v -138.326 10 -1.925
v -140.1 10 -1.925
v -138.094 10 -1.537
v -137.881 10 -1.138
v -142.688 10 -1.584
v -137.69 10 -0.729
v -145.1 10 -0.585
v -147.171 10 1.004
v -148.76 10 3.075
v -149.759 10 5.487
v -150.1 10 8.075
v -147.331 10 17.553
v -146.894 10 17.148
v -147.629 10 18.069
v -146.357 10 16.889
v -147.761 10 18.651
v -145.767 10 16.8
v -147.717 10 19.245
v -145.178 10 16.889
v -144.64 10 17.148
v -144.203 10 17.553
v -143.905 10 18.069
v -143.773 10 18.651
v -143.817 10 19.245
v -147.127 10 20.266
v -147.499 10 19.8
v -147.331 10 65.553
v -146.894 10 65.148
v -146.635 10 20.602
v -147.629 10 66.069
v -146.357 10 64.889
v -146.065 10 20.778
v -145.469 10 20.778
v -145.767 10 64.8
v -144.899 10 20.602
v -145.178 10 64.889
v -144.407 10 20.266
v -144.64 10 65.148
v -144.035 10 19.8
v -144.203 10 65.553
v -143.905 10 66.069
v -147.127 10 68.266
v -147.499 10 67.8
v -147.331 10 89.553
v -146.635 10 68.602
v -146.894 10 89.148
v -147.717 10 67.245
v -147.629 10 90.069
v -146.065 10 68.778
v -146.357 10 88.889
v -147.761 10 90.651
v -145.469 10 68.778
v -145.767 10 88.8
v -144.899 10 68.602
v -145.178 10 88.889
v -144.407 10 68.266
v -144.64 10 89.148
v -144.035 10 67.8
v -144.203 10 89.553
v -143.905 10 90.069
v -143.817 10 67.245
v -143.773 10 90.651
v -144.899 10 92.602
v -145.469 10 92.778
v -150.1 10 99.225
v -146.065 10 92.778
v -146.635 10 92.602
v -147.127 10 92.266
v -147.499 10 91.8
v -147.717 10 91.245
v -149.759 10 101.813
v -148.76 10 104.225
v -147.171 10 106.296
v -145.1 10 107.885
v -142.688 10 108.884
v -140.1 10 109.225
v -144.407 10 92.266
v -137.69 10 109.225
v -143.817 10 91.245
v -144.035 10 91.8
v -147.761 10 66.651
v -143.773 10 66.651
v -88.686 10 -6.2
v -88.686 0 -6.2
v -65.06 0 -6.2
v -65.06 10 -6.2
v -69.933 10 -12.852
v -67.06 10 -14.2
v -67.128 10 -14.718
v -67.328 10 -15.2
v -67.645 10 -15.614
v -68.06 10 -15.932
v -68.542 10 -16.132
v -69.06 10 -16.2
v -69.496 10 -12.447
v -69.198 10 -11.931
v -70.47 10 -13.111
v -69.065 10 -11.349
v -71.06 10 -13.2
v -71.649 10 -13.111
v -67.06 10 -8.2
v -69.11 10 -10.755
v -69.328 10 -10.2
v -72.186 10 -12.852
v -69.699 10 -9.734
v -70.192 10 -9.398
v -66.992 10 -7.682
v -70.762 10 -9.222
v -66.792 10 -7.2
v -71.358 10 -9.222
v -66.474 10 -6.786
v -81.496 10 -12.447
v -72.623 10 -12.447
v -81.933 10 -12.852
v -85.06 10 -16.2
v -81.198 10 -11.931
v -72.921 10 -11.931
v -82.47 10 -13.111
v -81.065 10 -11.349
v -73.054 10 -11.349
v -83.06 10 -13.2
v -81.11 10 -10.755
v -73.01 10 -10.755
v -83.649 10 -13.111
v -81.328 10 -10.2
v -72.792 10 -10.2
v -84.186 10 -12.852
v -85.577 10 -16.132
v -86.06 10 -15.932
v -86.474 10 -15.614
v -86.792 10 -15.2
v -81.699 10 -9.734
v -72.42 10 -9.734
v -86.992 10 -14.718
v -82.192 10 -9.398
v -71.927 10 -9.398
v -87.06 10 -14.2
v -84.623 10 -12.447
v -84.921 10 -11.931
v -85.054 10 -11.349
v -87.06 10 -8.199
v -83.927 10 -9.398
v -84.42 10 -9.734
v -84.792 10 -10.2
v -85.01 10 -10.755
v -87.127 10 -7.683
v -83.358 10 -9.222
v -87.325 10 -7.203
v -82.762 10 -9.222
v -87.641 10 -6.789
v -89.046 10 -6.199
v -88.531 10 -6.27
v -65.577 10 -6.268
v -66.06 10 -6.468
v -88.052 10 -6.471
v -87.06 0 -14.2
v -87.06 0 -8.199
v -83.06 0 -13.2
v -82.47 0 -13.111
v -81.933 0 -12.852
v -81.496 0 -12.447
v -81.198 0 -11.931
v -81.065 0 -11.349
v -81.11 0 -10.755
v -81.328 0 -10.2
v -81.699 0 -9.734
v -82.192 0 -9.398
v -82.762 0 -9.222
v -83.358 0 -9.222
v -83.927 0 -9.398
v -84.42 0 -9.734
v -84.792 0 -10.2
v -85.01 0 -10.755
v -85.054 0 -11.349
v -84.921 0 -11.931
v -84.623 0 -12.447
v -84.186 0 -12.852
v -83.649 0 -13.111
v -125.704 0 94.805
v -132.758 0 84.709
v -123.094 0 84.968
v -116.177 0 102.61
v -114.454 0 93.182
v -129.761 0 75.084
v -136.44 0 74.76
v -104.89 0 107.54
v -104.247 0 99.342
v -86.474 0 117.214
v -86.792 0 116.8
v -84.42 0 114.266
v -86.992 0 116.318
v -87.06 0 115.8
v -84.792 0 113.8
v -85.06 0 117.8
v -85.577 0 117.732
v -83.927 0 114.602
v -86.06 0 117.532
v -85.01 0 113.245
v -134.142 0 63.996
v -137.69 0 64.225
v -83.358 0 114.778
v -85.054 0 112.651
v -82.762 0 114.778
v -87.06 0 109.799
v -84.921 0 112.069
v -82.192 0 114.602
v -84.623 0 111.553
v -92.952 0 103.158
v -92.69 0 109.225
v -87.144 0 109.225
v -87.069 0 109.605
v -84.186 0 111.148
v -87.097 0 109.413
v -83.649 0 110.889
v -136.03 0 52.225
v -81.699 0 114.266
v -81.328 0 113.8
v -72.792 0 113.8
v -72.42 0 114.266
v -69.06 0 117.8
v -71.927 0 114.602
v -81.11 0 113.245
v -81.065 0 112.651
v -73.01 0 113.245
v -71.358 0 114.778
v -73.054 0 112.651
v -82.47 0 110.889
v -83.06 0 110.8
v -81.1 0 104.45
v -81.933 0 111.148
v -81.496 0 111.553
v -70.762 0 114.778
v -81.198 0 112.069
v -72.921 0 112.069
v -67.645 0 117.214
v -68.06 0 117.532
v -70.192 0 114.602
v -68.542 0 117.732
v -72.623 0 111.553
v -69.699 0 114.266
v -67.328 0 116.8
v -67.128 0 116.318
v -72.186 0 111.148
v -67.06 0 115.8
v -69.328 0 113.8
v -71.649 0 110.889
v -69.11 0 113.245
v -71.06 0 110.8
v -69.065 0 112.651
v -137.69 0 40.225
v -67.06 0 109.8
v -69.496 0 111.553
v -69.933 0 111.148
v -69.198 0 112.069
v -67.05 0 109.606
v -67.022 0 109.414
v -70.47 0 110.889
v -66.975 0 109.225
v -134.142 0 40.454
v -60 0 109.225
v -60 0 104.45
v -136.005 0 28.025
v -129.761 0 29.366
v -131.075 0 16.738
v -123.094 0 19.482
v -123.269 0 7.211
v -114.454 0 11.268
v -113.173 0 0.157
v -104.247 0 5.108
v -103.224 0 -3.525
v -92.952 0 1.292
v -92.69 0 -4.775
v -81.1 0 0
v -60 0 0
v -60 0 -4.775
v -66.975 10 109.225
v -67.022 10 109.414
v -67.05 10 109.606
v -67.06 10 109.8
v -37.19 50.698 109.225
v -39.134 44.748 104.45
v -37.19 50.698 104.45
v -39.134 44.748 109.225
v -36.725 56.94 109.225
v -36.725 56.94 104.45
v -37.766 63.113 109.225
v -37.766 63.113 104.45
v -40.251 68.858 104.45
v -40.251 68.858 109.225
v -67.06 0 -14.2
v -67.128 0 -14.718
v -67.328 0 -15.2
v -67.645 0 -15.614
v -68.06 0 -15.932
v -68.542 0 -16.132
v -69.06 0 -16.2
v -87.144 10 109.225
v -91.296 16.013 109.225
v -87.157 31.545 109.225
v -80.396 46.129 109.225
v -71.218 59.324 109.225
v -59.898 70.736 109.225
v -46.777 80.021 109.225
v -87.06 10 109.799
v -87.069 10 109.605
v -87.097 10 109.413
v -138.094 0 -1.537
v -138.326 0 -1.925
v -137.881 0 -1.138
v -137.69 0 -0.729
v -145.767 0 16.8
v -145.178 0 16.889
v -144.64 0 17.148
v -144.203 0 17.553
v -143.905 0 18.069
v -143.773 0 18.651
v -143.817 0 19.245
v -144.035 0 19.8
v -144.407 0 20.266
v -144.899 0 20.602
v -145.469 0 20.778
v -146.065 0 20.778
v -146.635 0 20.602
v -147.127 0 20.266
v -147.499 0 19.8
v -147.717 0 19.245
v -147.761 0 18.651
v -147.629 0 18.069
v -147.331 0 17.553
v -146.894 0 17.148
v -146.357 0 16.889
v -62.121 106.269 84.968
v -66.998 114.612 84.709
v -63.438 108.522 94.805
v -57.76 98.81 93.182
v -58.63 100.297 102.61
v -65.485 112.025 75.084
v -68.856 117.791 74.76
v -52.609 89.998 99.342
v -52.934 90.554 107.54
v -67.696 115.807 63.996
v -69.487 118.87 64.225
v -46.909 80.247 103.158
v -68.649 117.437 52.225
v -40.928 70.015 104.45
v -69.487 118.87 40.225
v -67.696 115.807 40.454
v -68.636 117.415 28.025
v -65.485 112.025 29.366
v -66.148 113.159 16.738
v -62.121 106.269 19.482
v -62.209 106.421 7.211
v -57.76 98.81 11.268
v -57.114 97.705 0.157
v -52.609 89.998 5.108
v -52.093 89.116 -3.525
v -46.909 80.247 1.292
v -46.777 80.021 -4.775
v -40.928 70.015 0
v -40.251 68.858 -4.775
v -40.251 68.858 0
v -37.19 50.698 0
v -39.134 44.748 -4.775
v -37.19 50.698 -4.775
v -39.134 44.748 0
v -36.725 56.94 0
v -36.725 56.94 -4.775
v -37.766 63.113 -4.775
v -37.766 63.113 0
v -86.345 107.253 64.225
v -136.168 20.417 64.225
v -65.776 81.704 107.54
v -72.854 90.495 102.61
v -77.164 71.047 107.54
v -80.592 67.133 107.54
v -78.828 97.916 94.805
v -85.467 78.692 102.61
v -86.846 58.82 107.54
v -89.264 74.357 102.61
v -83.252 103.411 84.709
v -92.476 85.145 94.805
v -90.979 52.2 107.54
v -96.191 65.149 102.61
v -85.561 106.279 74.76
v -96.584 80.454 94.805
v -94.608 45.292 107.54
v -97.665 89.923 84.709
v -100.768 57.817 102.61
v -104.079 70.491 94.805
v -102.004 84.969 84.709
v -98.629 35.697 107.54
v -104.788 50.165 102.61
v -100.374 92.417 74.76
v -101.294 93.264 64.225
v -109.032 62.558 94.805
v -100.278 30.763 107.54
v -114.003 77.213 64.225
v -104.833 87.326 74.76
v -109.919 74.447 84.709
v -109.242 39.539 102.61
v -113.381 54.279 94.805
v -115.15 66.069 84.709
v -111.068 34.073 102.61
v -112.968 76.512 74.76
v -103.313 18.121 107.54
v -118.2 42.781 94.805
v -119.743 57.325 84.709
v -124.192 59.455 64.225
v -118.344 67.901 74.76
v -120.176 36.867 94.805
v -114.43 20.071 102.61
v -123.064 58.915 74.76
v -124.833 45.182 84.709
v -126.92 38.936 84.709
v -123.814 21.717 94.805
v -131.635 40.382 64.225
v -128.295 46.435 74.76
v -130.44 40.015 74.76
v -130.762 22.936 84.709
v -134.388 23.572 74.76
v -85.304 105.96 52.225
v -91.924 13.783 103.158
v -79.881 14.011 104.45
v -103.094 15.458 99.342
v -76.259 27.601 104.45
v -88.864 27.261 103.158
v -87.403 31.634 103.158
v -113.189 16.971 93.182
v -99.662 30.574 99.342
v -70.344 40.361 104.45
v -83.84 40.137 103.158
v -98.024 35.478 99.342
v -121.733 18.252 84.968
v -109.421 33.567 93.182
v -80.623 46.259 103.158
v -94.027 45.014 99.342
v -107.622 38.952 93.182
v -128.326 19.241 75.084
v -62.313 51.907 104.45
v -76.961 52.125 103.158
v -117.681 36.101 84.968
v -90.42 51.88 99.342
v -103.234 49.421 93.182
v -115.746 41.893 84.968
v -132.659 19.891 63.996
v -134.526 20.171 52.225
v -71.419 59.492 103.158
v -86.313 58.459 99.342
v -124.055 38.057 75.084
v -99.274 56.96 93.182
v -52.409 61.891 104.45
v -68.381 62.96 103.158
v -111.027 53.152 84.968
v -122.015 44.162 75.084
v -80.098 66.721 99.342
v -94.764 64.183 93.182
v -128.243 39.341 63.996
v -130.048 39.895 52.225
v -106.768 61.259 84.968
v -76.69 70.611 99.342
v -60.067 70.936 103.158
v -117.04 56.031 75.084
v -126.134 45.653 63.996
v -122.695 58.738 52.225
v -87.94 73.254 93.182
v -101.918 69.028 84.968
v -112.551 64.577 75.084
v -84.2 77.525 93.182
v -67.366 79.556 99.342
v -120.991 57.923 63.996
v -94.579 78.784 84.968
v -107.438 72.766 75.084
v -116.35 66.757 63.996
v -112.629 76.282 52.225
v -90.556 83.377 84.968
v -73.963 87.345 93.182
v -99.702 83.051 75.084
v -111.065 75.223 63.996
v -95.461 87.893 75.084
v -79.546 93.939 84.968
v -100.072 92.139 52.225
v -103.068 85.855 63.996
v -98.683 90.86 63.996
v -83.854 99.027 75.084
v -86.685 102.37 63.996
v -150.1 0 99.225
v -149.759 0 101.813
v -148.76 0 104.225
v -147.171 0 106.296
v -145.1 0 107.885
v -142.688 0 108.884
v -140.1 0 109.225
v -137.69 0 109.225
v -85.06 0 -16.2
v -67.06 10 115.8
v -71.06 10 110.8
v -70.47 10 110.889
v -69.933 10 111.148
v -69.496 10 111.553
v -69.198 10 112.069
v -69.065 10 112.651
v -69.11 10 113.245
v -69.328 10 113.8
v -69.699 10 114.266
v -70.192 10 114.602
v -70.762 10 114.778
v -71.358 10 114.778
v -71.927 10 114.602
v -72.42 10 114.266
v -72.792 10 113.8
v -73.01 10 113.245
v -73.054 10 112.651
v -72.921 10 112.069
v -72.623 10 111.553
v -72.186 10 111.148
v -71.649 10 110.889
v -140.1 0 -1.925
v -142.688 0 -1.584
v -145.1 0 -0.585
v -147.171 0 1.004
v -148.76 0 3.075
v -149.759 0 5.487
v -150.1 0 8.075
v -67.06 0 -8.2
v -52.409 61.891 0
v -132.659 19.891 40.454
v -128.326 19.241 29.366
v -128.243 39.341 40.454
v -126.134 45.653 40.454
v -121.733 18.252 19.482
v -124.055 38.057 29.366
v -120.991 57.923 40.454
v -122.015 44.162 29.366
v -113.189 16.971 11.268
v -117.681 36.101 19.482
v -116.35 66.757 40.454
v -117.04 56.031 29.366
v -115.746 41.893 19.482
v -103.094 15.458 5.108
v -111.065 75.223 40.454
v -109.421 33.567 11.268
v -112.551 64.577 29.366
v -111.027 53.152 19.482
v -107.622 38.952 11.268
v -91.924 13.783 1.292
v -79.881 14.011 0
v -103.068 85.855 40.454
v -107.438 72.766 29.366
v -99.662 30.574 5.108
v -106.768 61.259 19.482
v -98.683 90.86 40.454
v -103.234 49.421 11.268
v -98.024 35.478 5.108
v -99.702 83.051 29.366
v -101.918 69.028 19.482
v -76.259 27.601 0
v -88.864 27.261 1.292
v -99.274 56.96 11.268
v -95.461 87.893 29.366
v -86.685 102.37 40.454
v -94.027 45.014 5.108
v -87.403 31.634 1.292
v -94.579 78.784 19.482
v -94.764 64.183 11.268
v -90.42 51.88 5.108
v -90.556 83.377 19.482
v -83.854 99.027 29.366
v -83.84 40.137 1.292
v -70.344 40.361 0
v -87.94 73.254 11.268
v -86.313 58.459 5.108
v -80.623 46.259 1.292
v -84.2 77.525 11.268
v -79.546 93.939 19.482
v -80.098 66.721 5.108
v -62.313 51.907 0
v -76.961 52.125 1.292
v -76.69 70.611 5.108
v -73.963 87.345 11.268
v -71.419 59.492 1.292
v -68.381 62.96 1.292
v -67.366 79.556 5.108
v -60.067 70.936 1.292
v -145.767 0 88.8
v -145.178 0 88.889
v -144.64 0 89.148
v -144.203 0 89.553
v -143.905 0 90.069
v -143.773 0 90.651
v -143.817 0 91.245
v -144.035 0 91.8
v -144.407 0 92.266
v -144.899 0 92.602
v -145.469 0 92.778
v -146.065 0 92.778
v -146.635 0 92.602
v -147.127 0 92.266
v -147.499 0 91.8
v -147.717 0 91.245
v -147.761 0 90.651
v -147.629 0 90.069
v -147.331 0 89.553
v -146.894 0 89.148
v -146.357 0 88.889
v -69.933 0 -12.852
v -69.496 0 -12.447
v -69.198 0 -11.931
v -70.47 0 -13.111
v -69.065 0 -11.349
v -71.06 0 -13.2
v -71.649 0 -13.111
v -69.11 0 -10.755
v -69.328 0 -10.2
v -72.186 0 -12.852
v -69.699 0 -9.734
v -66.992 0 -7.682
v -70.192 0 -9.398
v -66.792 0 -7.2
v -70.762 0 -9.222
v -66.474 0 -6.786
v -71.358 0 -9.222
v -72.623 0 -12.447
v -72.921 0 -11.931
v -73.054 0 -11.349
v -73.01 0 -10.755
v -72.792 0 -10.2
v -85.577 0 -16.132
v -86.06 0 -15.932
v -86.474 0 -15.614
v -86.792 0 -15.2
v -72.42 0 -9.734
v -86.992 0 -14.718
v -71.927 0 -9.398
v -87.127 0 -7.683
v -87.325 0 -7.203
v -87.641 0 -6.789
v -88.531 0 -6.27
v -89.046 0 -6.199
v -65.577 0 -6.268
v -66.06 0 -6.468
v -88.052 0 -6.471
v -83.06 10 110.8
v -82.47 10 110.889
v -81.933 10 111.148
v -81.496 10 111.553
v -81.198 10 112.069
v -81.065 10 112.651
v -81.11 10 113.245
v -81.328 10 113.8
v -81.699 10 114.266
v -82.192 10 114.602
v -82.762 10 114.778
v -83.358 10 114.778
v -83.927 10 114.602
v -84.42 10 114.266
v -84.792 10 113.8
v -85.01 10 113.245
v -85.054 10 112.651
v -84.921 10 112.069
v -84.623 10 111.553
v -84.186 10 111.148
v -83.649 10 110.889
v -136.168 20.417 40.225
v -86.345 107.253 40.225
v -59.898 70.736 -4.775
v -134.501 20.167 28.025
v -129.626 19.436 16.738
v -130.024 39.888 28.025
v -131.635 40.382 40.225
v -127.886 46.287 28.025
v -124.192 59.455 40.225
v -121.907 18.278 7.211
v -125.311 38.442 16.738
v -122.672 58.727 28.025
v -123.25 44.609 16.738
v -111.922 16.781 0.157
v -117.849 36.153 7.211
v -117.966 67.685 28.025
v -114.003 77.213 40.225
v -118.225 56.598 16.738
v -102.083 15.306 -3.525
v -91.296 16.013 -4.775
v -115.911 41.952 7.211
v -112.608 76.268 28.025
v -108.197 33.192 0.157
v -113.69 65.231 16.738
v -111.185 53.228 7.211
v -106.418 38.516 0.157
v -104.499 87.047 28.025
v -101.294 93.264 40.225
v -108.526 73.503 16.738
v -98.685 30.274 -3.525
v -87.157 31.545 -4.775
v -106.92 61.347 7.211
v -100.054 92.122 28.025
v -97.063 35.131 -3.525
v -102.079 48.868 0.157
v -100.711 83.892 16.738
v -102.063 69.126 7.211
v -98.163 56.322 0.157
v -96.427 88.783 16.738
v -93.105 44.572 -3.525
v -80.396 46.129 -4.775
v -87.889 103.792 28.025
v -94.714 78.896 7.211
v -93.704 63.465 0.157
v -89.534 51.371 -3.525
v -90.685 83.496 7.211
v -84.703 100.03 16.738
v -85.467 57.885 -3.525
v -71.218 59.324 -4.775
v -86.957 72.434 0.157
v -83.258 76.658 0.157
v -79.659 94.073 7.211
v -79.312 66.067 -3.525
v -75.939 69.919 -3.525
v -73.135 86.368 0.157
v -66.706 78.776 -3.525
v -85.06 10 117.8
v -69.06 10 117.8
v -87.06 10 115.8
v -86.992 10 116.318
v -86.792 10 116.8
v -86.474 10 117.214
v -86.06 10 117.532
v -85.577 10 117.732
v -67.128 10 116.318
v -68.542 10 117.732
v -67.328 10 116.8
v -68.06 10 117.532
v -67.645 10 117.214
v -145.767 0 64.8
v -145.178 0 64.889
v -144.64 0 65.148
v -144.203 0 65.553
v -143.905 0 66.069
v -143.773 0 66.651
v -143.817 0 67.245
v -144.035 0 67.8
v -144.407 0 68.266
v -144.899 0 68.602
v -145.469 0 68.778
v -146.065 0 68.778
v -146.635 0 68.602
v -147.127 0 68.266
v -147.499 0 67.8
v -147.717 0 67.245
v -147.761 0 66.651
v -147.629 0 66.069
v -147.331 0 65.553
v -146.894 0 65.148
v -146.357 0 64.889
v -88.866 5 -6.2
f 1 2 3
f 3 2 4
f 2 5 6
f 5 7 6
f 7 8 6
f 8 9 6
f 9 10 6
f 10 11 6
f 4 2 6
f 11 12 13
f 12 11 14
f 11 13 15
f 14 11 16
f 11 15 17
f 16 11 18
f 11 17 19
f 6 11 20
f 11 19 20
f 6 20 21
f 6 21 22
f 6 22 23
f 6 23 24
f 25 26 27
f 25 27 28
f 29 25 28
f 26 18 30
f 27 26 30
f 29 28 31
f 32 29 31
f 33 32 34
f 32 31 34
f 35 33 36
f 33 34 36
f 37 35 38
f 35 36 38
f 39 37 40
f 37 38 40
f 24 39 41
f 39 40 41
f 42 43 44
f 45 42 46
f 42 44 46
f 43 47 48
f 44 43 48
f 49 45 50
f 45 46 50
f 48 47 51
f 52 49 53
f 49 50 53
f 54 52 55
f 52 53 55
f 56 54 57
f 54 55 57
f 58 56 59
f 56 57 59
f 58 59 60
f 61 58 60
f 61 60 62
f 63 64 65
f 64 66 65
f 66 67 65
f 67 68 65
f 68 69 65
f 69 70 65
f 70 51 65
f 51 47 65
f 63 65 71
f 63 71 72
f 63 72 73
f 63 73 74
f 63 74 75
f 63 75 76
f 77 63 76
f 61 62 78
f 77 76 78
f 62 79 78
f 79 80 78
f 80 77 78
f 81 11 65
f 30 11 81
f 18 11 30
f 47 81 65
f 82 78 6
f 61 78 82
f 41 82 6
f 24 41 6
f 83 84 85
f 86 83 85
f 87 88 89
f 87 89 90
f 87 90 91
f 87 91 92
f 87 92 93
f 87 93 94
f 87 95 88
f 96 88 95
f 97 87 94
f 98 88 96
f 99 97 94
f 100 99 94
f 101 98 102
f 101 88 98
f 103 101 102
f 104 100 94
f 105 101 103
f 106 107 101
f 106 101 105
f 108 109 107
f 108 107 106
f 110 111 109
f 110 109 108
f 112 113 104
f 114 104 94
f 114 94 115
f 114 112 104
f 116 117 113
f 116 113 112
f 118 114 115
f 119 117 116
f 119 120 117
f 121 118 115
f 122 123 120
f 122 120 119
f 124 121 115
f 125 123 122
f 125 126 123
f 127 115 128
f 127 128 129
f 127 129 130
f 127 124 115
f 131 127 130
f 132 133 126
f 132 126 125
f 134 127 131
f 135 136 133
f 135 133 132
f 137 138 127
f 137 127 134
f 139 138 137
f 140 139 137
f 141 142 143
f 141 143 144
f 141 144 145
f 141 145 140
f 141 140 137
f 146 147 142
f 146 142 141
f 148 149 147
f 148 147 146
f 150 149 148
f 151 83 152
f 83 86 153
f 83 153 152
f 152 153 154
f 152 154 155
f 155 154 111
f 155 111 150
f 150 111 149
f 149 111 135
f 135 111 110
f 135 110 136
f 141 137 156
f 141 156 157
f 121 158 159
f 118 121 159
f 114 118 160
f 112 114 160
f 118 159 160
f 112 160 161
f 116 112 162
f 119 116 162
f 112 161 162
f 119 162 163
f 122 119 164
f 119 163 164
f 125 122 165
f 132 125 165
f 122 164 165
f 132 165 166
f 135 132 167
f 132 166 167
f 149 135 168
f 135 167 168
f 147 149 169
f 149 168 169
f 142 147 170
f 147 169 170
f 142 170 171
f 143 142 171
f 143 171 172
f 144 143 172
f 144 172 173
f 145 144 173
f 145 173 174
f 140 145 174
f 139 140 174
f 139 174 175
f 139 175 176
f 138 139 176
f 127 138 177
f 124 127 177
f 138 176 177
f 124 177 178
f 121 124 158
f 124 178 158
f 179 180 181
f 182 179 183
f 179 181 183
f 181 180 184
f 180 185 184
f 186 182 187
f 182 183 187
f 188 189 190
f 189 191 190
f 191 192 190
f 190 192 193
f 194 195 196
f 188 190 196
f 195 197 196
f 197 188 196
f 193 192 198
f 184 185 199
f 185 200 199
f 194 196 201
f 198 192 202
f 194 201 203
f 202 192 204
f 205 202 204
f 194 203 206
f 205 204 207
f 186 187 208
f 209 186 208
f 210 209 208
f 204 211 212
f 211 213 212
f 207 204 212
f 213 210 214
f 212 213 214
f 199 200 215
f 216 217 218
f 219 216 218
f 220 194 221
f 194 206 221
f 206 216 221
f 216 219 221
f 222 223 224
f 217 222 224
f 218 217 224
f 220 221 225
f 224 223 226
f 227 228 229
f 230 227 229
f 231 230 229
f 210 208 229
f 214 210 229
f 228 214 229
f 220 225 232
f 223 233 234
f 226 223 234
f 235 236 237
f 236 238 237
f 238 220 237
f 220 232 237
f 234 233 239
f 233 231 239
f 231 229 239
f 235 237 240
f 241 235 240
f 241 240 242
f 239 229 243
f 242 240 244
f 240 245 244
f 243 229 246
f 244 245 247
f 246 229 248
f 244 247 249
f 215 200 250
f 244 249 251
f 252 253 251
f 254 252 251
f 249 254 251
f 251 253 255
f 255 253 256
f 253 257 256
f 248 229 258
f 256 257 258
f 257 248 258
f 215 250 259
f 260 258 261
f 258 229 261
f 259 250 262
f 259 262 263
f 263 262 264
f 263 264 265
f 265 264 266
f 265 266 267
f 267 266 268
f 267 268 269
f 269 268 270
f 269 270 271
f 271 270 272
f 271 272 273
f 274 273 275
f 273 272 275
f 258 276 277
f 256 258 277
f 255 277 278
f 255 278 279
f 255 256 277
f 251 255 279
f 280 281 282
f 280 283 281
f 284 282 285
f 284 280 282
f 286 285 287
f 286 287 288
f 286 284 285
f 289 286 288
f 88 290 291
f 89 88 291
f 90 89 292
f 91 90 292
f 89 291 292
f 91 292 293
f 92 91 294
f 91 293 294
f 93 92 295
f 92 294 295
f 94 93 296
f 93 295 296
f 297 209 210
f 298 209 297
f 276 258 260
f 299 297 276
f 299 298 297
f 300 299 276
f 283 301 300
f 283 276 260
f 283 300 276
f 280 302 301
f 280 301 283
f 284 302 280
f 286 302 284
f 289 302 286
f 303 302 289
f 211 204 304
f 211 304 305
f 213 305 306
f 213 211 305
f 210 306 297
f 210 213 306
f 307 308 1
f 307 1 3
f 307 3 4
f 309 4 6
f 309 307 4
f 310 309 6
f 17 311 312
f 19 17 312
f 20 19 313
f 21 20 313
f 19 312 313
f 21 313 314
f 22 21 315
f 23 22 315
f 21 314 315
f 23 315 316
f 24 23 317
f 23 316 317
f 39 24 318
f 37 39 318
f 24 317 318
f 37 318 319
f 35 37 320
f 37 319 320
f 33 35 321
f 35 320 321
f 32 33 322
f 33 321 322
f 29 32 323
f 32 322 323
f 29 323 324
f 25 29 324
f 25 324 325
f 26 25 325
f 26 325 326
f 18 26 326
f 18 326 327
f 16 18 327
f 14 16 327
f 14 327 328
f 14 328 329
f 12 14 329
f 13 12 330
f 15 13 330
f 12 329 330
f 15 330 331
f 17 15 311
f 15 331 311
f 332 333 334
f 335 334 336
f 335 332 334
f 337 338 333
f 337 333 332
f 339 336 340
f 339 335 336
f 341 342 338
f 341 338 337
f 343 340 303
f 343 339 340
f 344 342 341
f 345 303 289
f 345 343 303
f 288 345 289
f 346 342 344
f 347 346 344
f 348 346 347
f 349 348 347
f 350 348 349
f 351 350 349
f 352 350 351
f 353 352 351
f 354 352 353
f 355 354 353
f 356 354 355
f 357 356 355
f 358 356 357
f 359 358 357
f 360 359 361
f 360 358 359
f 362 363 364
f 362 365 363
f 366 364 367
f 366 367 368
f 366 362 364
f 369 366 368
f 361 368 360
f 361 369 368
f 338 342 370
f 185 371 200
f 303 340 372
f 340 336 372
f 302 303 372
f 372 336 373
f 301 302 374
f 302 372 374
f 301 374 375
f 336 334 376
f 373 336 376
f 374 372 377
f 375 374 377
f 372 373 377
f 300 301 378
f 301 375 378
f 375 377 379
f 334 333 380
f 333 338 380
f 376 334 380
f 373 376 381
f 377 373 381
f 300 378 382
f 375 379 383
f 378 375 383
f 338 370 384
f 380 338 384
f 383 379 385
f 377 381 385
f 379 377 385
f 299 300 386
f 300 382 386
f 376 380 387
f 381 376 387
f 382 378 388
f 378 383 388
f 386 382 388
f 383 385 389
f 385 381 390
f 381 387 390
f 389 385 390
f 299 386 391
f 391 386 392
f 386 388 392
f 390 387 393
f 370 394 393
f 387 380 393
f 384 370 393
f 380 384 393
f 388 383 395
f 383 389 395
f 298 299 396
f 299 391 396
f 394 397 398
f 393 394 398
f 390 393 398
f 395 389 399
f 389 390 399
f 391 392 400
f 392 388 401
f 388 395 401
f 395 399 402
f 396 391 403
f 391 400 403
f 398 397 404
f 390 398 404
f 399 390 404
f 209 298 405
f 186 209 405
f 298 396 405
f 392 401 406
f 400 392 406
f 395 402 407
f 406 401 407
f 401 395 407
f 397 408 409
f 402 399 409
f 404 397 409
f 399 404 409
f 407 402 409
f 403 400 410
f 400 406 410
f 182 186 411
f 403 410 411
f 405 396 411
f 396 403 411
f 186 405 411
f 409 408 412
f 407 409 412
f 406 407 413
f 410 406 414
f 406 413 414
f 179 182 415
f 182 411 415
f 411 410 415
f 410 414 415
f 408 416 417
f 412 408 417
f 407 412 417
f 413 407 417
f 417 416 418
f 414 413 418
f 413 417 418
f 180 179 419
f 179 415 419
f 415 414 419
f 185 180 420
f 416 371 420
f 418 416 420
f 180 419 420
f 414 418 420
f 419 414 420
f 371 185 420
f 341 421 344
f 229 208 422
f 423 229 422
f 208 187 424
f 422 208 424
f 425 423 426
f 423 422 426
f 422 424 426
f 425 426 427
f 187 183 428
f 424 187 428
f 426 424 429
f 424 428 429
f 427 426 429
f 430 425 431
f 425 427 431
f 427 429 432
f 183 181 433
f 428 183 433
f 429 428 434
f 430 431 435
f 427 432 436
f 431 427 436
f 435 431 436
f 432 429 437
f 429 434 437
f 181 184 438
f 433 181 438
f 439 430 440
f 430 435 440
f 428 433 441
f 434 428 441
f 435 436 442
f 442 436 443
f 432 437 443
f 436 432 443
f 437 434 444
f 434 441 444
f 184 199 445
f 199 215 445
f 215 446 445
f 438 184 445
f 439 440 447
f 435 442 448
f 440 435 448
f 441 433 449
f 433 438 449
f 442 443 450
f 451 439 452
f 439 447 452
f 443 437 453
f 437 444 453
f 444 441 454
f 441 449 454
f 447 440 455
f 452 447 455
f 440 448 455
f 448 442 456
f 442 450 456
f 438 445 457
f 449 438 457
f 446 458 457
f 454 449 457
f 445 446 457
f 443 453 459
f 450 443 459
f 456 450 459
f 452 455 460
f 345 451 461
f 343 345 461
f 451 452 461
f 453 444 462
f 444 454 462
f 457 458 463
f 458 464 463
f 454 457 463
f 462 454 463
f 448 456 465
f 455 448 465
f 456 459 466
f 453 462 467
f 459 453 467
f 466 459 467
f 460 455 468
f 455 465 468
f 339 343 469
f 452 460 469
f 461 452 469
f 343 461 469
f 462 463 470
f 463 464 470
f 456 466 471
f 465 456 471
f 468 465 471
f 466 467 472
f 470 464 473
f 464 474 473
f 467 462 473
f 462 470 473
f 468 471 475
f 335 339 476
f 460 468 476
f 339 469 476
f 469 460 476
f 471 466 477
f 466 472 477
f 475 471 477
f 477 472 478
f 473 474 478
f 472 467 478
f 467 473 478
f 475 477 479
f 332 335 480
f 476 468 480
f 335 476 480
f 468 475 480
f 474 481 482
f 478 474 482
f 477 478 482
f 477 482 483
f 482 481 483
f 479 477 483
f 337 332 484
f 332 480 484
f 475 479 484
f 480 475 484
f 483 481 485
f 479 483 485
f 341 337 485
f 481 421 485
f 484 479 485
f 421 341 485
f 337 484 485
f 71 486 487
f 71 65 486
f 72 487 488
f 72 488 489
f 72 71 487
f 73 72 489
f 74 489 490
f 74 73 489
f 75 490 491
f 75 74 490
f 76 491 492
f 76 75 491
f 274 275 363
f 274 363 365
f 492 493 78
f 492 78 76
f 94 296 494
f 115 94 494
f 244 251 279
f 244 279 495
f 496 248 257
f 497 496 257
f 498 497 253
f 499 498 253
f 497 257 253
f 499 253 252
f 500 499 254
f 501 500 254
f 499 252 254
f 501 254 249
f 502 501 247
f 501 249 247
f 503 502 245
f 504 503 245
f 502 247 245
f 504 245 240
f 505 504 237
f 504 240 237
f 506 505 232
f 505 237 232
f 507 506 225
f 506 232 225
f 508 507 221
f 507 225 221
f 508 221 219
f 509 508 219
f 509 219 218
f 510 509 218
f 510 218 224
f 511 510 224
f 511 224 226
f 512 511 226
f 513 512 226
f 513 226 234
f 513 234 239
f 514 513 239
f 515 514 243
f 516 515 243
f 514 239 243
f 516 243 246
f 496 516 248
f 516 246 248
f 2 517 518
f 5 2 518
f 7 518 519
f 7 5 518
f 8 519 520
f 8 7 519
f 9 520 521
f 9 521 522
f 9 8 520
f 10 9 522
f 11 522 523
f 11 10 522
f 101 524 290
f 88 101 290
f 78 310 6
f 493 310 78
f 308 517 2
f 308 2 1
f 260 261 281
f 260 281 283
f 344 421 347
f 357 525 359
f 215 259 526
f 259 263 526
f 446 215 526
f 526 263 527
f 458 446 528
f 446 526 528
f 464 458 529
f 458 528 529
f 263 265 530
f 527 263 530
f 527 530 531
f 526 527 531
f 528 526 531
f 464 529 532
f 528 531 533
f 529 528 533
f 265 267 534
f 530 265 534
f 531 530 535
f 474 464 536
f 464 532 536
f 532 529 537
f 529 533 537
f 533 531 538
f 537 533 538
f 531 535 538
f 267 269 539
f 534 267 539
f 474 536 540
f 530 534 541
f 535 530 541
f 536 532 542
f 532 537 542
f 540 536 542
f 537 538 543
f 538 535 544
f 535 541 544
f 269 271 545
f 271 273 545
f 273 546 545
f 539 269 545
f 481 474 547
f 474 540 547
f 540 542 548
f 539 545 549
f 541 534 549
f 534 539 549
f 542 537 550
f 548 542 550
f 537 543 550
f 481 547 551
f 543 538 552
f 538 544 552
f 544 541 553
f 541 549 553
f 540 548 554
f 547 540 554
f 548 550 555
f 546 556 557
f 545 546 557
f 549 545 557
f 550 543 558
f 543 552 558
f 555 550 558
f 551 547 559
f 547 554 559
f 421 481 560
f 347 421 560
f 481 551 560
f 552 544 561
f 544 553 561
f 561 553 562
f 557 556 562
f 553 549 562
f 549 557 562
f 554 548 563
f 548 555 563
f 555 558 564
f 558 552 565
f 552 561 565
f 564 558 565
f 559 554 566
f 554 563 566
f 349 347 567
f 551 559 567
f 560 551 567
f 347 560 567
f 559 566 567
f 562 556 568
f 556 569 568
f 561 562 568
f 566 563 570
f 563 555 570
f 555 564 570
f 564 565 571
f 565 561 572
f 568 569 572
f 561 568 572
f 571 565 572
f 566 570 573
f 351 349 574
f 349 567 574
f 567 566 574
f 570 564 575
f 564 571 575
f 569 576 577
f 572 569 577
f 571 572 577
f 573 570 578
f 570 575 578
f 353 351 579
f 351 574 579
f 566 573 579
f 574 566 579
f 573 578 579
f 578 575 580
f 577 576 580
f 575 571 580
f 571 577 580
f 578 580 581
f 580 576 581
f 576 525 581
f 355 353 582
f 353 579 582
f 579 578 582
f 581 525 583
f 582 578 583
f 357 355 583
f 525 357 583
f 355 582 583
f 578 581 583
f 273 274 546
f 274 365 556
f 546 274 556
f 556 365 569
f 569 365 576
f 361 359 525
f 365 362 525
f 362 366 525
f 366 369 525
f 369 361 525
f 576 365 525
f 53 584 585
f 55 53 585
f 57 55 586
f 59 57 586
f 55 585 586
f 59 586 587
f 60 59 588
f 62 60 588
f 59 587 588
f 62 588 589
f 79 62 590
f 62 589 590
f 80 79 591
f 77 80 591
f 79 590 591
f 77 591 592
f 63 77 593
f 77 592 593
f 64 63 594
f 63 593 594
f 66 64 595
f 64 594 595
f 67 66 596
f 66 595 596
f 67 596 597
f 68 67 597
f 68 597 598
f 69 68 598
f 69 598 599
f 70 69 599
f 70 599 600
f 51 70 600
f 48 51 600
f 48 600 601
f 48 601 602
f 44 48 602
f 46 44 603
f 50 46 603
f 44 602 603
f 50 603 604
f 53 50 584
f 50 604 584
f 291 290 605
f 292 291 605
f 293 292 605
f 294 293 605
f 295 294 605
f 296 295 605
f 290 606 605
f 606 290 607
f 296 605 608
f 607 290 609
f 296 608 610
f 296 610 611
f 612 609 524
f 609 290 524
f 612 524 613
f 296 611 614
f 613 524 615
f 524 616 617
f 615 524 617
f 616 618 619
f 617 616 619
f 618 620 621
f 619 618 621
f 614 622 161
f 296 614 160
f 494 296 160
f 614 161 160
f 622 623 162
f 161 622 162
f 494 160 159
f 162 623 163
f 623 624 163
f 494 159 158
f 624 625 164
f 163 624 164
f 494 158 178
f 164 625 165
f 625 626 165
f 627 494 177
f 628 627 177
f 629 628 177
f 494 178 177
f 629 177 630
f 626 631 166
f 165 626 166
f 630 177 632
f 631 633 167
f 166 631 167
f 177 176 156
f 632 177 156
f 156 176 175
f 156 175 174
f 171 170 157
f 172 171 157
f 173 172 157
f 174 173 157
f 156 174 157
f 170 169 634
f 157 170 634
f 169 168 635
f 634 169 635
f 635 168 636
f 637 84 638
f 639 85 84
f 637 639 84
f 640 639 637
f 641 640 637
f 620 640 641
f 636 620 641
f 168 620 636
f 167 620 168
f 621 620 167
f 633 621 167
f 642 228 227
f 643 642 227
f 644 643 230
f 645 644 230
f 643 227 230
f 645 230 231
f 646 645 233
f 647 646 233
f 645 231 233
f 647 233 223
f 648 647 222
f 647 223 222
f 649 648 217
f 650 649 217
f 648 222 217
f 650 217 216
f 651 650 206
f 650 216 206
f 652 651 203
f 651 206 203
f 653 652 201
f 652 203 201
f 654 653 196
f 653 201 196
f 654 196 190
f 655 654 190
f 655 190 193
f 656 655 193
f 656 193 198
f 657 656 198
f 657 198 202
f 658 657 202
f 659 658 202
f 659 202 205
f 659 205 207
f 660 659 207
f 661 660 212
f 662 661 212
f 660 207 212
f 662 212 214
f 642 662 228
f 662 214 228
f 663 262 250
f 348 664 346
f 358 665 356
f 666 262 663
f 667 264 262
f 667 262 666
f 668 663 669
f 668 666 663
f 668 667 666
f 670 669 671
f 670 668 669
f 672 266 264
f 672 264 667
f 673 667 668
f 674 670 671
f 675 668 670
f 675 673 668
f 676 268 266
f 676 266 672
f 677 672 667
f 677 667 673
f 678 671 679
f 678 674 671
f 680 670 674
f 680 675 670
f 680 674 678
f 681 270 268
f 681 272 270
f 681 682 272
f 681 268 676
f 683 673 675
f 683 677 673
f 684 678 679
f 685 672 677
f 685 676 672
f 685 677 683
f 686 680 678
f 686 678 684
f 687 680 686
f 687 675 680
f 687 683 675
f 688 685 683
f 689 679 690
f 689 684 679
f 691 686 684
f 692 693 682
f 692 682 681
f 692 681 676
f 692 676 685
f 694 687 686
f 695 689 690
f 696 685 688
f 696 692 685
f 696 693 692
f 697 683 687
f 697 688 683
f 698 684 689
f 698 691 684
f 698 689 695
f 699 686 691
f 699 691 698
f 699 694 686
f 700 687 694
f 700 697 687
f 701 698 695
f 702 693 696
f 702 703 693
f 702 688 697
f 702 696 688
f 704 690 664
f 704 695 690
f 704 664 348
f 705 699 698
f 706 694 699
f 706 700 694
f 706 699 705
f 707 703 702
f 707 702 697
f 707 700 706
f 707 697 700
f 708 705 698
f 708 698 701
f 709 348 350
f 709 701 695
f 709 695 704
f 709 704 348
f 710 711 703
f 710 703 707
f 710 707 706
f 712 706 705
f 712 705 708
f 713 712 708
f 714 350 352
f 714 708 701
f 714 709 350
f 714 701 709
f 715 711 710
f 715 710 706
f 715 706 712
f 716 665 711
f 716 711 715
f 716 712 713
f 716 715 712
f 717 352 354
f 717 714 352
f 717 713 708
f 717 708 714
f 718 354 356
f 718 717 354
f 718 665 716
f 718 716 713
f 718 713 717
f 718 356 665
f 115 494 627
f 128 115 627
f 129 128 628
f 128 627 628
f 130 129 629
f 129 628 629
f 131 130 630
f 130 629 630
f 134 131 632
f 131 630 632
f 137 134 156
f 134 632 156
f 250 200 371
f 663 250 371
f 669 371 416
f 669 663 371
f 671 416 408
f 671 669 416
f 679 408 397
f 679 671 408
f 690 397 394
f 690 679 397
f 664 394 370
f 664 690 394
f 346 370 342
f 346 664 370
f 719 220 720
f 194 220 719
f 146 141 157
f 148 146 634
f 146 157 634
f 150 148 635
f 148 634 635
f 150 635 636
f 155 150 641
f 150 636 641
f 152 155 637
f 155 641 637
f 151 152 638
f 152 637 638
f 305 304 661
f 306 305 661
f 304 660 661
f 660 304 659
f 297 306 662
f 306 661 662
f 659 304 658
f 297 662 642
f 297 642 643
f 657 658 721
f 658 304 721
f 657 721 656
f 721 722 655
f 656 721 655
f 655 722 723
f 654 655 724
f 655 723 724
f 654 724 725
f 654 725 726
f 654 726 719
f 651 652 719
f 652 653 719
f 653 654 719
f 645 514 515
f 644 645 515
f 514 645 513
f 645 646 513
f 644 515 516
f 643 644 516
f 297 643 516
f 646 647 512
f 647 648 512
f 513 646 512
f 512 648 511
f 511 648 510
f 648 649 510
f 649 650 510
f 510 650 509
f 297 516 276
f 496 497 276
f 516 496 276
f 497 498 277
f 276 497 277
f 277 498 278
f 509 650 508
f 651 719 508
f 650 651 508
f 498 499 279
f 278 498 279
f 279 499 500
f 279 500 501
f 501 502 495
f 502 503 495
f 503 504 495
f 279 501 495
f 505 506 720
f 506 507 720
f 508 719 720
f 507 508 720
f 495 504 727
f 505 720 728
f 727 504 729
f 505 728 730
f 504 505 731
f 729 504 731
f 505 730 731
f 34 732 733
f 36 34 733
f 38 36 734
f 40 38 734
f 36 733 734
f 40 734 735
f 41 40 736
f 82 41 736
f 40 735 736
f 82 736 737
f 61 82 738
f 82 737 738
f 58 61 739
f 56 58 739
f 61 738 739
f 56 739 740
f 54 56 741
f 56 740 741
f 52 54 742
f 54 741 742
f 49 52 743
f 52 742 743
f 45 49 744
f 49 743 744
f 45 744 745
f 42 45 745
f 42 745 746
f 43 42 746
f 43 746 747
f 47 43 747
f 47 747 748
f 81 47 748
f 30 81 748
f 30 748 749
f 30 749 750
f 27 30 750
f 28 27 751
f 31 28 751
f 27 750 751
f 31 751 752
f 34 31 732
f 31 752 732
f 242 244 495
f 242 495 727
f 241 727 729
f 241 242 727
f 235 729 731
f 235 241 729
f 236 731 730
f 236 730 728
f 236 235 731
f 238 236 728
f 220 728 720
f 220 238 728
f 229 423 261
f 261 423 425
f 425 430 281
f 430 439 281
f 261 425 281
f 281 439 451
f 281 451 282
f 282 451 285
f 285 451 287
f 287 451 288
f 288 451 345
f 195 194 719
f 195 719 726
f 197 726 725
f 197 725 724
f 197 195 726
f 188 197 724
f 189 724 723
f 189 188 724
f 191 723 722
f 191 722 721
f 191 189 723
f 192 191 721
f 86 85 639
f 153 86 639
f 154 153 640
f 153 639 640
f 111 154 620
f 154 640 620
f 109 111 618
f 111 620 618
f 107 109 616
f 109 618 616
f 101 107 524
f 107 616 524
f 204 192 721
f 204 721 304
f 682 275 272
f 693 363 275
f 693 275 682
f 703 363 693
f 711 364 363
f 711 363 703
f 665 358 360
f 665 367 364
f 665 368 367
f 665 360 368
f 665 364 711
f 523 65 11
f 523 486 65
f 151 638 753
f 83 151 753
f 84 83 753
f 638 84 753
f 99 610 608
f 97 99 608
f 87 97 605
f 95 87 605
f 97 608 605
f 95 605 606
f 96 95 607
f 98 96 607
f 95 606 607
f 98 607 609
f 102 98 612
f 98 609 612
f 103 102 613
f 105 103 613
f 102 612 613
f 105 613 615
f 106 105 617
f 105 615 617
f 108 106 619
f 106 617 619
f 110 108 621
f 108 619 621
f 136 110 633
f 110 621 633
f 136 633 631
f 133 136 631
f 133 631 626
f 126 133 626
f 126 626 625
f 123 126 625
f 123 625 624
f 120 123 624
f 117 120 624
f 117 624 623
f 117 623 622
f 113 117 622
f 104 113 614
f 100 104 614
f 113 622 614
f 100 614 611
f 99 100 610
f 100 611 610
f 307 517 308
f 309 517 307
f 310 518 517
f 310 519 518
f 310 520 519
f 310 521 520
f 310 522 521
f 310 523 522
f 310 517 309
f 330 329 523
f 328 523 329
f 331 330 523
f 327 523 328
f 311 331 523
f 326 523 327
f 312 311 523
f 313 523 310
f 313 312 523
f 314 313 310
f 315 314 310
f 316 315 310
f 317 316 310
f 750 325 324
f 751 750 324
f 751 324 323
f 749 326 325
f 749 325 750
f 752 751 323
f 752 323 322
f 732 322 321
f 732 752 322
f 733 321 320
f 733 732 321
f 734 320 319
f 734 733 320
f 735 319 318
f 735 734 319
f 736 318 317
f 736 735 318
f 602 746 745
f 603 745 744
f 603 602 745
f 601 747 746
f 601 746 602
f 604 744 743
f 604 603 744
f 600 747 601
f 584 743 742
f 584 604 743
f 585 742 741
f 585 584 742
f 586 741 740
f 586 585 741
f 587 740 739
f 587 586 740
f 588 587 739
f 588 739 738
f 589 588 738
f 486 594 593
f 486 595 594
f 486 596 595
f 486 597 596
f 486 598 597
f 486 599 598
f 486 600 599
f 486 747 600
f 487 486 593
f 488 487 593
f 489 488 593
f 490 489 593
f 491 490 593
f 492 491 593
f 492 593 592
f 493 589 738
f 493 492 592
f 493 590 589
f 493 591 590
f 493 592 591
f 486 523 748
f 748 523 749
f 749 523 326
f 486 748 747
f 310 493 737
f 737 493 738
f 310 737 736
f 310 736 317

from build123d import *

# Parameters (mm, degrees)
BOSS_EXTRUDE1_DEPTH = 104.45
BOSS_EXTRUDE2_DEPTH = 4.7752
BOSS_EXTRUDE3_START = 4.7752
BOSS_EXTRUDE3_DEPTH = 4.7752
SKETCH4_R           = 1.9999999999999967
SKETCH4_R_2         = 1.9999999999999962
BOSS_EXTRUDE4_DEPTH = 10
FILLET1_R           = 10
FILLET3_R           = 55
FILLET4_R           = 45
CHAMFER1_SIZE       = 60.00000000000001
CHAMFER1_SIZE2      = 66.13522872048569
FILLET5_R           = 26


with BuildPart() as part:
    # Sketch1 → Boss-Extrude1 (new body)
    with BuildSketch(Plane.XY):
        with BuildLine():
            Line((-137.69000000000003, 0), (-136.1, 0))
            ThreePointArc((-136.1, 0), (-118.0490106345522, 67.73212744483506), (-68.68426027621781, 117.49758461478588))
            Line((-68.68426027621781, 117.49758461478588), (-69.48667007665269, 118.87026029103507))
            ThreePointArc((-69.48667007665269, 118.87026029103507), (-119.42812839288389, 68.52341387126629), (-137.69000000000003, 0))
        make_face()
    extrude(amount=BOSS_EXTRUDE1_DEPTH)

    # Sketch2 → Boss-Extrude2 (add)
    with BuildSketch(Plane.XY.offset(104.45)):
        with BuildLine():
            Line((-137.69000000000003, 1.686e-14), (0, 0))
            Line((0, 0), (-69.48667007665271, 118.87026029103507))
            ThreePointArc((-69.48667007665271, 118.87026029103507), (-119.42812839288392, 68.5234138712663), (-137.69000000000003, 1.686e-14))
        make_face()
    extrude(amount=BOSS_EXTRUDE2_DEPTH)

    # Sketch3 → Boss-Extrude3 (add)
    with BuildSketch(Plane(origin=(0, 0, 0), x_dir=(-1, 0, 0), z_dir=(0, 0, -1)).offset(BOSS_EXTRUDE3_START)):
        with BuildLine():
            Line((0, 0), (137.69000000000003, 1.686e-14))
            ThreePointArc((137.69000000000003, 1.686e-14), (119.42812839288389, 68.52341387126629), (69.4866700766527, 118.87026029103508))
            Line((69.4866700766527, 118.87026029103508), (0, 0))
        make_face()
    extrude(amount=-BOSS_EXTRUDE3_DEPTH)

    # Sketch4 → Boss-Extrude4 (add)
    # profile 1 of 5: a face of its own
    with BuildSketch(Plane.XZ):
        with BuildLine():
            Line((-137.69000000000003, 6.328766650845793), (-137.69000000000003, 109.2252))
            Line((-137.69000000000003, 109.2252), (-150.10000000000002, 109.2252))
            Line((-150.10000000000002, 109.2252), (-150.10000000000002, 10.475690213138677))
            ThreePointArc((-150.10000000000002, 10.475690213138678), (-142.97351570054127, 11.159843802640754), (-137.69000000000005, 6.32876665084579))
        make_face()
        with Locations(Location((-145.76703973293544, 18.800000000059715, 0), (0, 0, 270))):
            Circle(SKETCH4_R, mode=Mode.SUBTRACT)
        with Locations(Location((-145.76703973293542, 66.8000000000597, 0), (0, 0, 270))):
            Circle(SKETCH4_R, mode=Mode.SUBTRACT)
        with Locations(Location((-145.7670397329354, 90.80000000005973, 0), (0, 0, 270))):
            Circle(SKETCH4_R, mode=Mode.SUBTRACT)
    # profile 2 of 5: a face of its own
    with BuildSketch(Plane.XZ):
        with BuildLine():
            ThreePointArc((-87.05969357051328, 109.79869615131716), (-87.0808016736092, 109.50888942519616), (-87.14368092736706, 109.22519999999997))
            Line((-87.14368092736706, 109.2252), (-66.97531486918743, 109.2252))
            ThreePointArc((-66.97531486918743, 109.22520000000003), (-67.03848645979555, 109.50951987797353), (-67.05969357051326, 109.80000000005735))
            Line((-67.05969357051326, 109.80000000005735), (-67.05969357051326, 115.80000000005734))
            ThreePointArc((-67.05969357051328, 115.80000000005734), (-67.64548000814017, 117.21421356243043), (-69.05969357051326, 117.80000000005734))
            Line((-69.05969357051326, 117.80000000005734), (-85.05969357051326, 117.80000000005734))
            ThreePointArc((-85.05969357051326, 117.80000000005734), (-86.47390713288635, 117.21421356243043), (-87.05969357051328, 115.80000000005734))
            Line((-87.05969357051328, 115.80000000005734), (-87.05969357051328, 109.79869615131716))
        make_face()
        with Locations(Location((-83.05969357051332, 112.8000000000573, 0), (0, 0, 270))):
            Circle(SKETCH4_R, mode=Mode.SUBTRACT)
        with Locations(Location((-71.05969357051333, 112.8000000000573, 0), (0, 0, 270))):
            Circle(SKETCH4_R, mode=Mode.SUBTRACT)
    # profile 3 of 5: a face of its own
    with BuildSketch(Plane.XZ):
        with BuildLine():
            Line((-137.69000000000003, -0.7287666507264419), (-137.69000000000003, 6.328766650845793))
            ThreePointArc((-137.69000000000005, 6.32876665084579), (-142.97351570054127, 11.159843802640754), (-150.10000000000002, 10.475690213138678))
            Line((-150.10000000000002, 10.475690213138677), (-150.10000000000002, -1.9248000000000047))
            Line((-150.10000000000002, -1.9248000000000043), (-138.32613724180214, -1.9248000000000043))
            ThreePointArc((-138.32613724180214, -1.924799999999971), (-137.98505690973883, -1.3390226215975511), (-137.69000000000005, -0.7287666507264476))
        make_face()
    # profile 4 of 5: a face of its own
    with BuildSketch(Plane.XZ):
        with BuildLine():
            add(Edge.make_bspline(
                [(-89.04570479198645, -6.19874157019467), (-88.86578961884237, -6.199999999942648), (-88.685869728687, -6.199999999942648)],
                knots=[4.705147792502203, 4.705147792502203, 4.705147792502203, 4.71238898038469, 4.71238898038469, 4.71238898038469], degree=2, weights=[1, 0.9999934456569163, 1]))
            Line((-88.685869728687, -6.199999999942648), (-65.0596935705133, -6.1999999999426825))
            ThreePointArc((-65.0596935705133, -6.1999999999426825), (-66.47390713288638, -6.7857864375695796), (-67.0596935705133, -8.199999999942657))
            Line((-67.0596935705133, -8.199999999942657), (-67.0596935705133, -14.199999999942719))
            ThreePointArc((-67.0596935705133, -14.199999999942719), (-67.64548000814021, -15.614213562315815), (-69.0596935705133, -16.19999999994272))
            Line((-69.0596935705133, -16.19999999994272), (-85.05969357051329, -16.199999999942712))
            ThreePointArc((-85.05969357051329, -16.199999999942712), (-86.4739071328864, -15.614213562315818), (-87.0596935705133, -14.199999999942714))
            Line((-87.0596935705133, -14.199999999942714), (-87.0596935705133, -8.19869615120245))
            ThreePointArc((-87.0596935705133, -8.19869615120245), (-87.64054213015943, -6.789435301837706), (-89.04570479198645, -6.19874157019467))
        make_face()
        with Locations(Location((-83.05969357051332, -11.199999999942742, 0), (0, 0, 270))):
            Circle(SKETCH4_R_2, mode=Mode.SUBTRACT)
        with Locations(Location((-71.05969357051333, -11.199999999942742, 0), (0, 0, 269.999999999))):
            Circle(SKETCH4_R_2, mode=Mode.SUBTRACT)
    # profile 5 of 5: a face of its own
    with BuildSketch(Plane.XZ):
        with BuildLine():
            Line((-66.97531486918743, 109.2252), (-87.14368092736706, 109.2252))
            ThreePointArc((-87.14368092736706, 109.22519999999997), (-87.85972630188988, 108.19866898049219), (-89.04570479198642, 107.79874157030937))
            add(Edge.make_bspline(
                [(-88.68586972868695, 107.80000000005735), (-88.86578961884233, 107.80000000005735), (-89.04570479198642, 107.79874157030937)],
                knots=[4.71238898038469, 4.71238898038469, 4.71238898038469, 4.719630168267177, 4.719630168267177, 4.719630168267177], degree=2, weights=[1, 0.9999934456569163, 1]))
            Line((-88.68586972868694, 107.80000000005735), (-65.05969357051326, 107.80000000005735))
            ThreePointArc((-65.05969357051326, 107.80000000005735), (-66.25351097696311, 108.19538166535676), (-66.97531486918743, 109.22520000000003))
        make_face()
    extrude(amount=-BOSS_EXTRUDE4_DEPTH)


with BuildPart() as boss_extrude4_piece_1:
    # of the separate pieces the step leaves, piece 1, a body of its own (boss_extrude4_pieces)
    add(part.part.solids().sort_by_distance((-68.684260276, 117.497584615, 0))[0])

    # Fillet3
    # the kernel refuses this fillet: 55 mm, written as the material it adds along each edge
    with BuildSketch(Plane(origin=(9.948e-14, -5.329e-14, 104.45), x_dir=(-1, 3.9e-16, 0), z_dir=(-3.9e-16, -1, 0))) as fillet3_piece_1:
        with BuildLine():
            CenterArc((136.10000000000014 - FILLET3_R, FILLET3_R), FILLET3_R, 270, 90)
            Line((136.10000000000014 - FILLET3_R, -1.421e-14), (136.10000000000014, 0))
            Line((136.10000000000014, 0), (136.10000000000014, FILLET3_R))
        make_face()
    revolve(axis=Axis((9.948e-14, -5.329e-14, 104.45), (0, 0, -1)), revolution_arc=59.69119827809603)
    with BuildSketch(Plane(origin=(9.948e-14, -5.329e-14, 0), x_dir=(-1, 3.9e-16, 0), z_dir=(-3.9e-16, -1, 0))) as fillet3_piece_2:
        with BuildLine():
            CenterArc((136.10000000000014 - FILLET3_R, -FILLET3_R), FILLET3_R, 0, 90)
            Line((136.10000000000014 - FILLET3_R, 7.11e-15), (136.10000000000014, 0))
            Line((136.10000000000014, 0), (136.10000000000014, -FILLET3_R))
        make_face()
    revolve(axis=Axis((9.948e-14, -5.329e-14, 0), (0, 0, -1)), revolution_arc=59.69119827809603)

    # Fillet4
    fillet4_edges = [boss_extrude4_piece_1.edges().sort_by_distance(p)[0] for p in [
        (-119.42812839288393, 68.52341387126631, 109.2252),
        (-119.4281283928839, 68.5234138712663, -4.7752),
    ]]
    fillet(fillet4_edges, radius=FILLET4_R)

    # Chamfer1
    chamfer1_edges = [boss_extrude4_piece_1.edges().sort_by_distance(p)[0] for p in [
        (0, 0, 106.83760000000001),
        (0, 0, -2.3876),
    ]]
    chamfer1_side = [boss_extrude4_piece_1.faces().sort_by_distance(p)[0] for p in [
        (-46.345000000000006, 5.68e-15, -2.9317462886429677),
    ]]
    chamfer(chamfer1_edges, length=CHAMFER1_SIZE, length2=CHAMFER1_SIZE2, reference=chamfer1_side[0])

    # Fillet5
    fillet5_edges = [boss_extrude4_piece_1.edges().sort_by_distance(p)[0] for p in [
        (-33.37582118196211, 57.09573572816664, 106.83760000000001),
        (-33.37582118196211, 57.09573572816664, -2.3876),
    ]]
    fillet(fillet5_edges, radius=FILLET5_R)


with BuildPart() as boss_extrude4_piece_2:
    # of the separate pieces the step leaves, piece 2, a body of its own (boss_extrude4_pieces)
    add(part.part.solids().sort_by_distance((-137.69, 10, 109.2252))[0])

    # Fillet1
    fillet1_edges = [boss_extrude4_piece_2.edges().sort_by_distance(p)[0] for p in [
        (-150.10000000000002, 5, 109.2252),
        (-150.10000000000002, 5, -1.9248000000000045),
    ]]
    fillet(fillet1_edges, radius=FILLET1_R)


with BuildPart() as boss_extrude4_piece_3:
    # of the separate pieces the step leaves, piece 3, a body of its own (boss_extrude4_pieces)
    add(part.part.solids().sort_by_distance((-89.045704792, 0, -6.19874157))[0])


solid = Compound([boss_extrude4_piece_1.part, boss_extrude4_piece_2.part, boss_extrude4_piece_3.part])
